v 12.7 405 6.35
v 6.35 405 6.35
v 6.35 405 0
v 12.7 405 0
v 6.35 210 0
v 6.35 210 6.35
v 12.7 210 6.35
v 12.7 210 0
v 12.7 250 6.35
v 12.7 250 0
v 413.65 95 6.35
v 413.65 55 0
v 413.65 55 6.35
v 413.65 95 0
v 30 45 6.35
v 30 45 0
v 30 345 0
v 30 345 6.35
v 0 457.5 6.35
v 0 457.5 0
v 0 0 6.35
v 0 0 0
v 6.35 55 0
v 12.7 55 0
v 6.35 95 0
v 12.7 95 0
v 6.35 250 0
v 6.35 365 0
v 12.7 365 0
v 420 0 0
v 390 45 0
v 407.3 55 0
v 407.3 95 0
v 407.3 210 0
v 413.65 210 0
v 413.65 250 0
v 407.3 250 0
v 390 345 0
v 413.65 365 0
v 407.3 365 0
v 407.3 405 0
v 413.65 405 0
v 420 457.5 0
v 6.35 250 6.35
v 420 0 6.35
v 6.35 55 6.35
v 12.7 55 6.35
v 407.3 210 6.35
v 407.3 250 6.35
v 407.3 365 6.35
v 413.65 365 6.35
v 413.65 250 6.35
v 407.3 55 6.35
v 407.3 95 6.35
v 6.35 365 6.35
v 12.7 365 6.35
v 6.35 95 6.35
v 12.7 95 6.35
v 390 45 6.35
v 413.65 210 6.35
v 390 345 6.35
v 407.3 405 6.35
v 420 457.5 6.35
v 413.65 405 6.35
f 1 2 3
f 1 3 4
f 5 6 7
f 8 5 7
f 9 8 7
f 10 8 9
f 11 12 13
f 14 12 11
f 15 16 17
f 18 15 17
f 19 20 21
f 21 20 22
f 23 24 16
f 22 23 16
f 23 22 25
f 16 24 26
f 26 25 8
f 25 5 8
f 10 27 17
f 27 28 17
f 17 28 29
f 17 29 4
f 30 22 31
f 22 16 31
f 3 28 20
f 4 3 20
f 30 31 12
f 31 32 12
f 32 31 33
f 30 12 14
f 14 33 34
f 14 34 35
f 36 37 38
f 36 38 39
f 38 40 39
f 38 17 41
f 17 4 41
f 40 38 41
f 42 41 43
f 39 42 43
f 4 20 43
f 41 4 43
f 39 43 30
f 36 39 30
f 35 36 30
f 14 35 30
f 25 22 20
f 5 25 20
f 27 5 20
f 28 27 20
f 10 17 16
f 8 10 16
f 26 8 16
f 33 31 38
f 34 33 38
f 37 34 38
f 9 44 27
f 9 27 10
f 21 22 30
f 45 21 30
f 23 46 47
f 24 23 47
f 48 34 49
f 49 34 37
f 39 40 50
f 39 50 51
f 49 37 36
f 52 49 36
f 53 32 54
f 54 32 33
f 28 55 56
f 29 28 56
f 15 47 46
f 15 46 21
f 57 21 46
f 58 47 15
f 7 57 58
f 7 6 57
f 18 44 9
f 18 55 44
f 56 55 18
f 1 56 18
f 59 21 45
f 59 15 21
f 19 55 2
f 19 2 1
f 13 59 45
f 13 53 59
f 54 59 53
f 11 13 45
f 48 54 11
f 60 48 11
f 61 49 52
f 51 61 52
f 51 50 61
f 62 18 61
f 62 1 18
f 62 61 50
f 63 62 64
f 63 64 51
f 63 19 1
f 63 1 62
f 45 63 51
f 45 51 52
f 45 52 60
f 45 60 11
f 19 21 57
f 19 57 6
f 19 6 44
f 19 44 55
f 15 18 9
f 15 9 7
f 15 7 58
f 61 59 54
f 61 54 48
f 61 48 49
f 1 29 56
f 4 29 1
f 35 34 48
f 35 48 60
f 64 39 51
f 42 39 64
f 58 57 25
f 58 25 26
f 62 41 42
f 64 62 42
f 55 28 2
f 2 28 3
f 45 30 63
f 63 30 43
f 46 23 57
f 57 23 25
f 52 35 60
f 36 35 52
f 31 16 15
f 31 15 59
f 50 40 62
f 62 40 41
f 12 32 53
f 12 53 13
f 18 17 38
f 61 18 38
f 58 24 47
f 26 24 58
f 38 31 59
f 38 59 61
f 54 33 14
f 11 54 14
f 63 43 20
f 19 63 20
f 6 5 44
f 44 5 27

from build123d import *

# Parameters (mm, degrees)
SKETCH1_W           = 6.35
SKETCH1_H           = 40
SKETCH1_W_2         = 360
SKETCH1_H_2         = 300
BOSS_EXTRUDE1_DEPTH = 6.35


with BuildPart() as part:
    # Sketch1 → Boss-Extrude1 (new body)
    with BuildSketch(Plane.XY):
        Polygon((0, 0), (420, 0), (420, 457.5), (413.65, 457.5), (407.3, 457.5), (12.7, 457.5), (6.35, 457.5), (0, 457.5), align=None)
        with Locations((9.525, 385)):
            Rectangle(SKETCH1_W, SKETCH1_H, mode=Mode.SUBTRACT)
        with Locations((410.475, 385)):
            Rectangle(SKETCH1_W, SKETCH1_H, mode=Mode.SUBTRACT)
        with Locations((9.525, 230)):
            Rectangle(SKETCH1_W, SKETCH1_H, mode=Mode.SUBTRACT)
        with Locations((410.475, 230)):
            Rectangle(SKETCH1_W, SKETCH1_H, mode=Mode.SUBTRACT)
        with Locations((410.475, 75)):
            Rectangle(SKETCH1_W, SKETCH1_H, mode=Mode.SUBTRACT)
        with Locations((9.525, 75)):
            Rectangle(SKETCH1_W, SKETCH1_H, mode=Mode.SUBTRACT)
        with Locations((210, 195)):
            Rectangle(SKETCH1_W_2, SKETCH1_H_2, mode=Mode.SUBTRACT)
    extrude(amount=BOSS_EXTRUDE1_DEPTH)


solid = part.part
